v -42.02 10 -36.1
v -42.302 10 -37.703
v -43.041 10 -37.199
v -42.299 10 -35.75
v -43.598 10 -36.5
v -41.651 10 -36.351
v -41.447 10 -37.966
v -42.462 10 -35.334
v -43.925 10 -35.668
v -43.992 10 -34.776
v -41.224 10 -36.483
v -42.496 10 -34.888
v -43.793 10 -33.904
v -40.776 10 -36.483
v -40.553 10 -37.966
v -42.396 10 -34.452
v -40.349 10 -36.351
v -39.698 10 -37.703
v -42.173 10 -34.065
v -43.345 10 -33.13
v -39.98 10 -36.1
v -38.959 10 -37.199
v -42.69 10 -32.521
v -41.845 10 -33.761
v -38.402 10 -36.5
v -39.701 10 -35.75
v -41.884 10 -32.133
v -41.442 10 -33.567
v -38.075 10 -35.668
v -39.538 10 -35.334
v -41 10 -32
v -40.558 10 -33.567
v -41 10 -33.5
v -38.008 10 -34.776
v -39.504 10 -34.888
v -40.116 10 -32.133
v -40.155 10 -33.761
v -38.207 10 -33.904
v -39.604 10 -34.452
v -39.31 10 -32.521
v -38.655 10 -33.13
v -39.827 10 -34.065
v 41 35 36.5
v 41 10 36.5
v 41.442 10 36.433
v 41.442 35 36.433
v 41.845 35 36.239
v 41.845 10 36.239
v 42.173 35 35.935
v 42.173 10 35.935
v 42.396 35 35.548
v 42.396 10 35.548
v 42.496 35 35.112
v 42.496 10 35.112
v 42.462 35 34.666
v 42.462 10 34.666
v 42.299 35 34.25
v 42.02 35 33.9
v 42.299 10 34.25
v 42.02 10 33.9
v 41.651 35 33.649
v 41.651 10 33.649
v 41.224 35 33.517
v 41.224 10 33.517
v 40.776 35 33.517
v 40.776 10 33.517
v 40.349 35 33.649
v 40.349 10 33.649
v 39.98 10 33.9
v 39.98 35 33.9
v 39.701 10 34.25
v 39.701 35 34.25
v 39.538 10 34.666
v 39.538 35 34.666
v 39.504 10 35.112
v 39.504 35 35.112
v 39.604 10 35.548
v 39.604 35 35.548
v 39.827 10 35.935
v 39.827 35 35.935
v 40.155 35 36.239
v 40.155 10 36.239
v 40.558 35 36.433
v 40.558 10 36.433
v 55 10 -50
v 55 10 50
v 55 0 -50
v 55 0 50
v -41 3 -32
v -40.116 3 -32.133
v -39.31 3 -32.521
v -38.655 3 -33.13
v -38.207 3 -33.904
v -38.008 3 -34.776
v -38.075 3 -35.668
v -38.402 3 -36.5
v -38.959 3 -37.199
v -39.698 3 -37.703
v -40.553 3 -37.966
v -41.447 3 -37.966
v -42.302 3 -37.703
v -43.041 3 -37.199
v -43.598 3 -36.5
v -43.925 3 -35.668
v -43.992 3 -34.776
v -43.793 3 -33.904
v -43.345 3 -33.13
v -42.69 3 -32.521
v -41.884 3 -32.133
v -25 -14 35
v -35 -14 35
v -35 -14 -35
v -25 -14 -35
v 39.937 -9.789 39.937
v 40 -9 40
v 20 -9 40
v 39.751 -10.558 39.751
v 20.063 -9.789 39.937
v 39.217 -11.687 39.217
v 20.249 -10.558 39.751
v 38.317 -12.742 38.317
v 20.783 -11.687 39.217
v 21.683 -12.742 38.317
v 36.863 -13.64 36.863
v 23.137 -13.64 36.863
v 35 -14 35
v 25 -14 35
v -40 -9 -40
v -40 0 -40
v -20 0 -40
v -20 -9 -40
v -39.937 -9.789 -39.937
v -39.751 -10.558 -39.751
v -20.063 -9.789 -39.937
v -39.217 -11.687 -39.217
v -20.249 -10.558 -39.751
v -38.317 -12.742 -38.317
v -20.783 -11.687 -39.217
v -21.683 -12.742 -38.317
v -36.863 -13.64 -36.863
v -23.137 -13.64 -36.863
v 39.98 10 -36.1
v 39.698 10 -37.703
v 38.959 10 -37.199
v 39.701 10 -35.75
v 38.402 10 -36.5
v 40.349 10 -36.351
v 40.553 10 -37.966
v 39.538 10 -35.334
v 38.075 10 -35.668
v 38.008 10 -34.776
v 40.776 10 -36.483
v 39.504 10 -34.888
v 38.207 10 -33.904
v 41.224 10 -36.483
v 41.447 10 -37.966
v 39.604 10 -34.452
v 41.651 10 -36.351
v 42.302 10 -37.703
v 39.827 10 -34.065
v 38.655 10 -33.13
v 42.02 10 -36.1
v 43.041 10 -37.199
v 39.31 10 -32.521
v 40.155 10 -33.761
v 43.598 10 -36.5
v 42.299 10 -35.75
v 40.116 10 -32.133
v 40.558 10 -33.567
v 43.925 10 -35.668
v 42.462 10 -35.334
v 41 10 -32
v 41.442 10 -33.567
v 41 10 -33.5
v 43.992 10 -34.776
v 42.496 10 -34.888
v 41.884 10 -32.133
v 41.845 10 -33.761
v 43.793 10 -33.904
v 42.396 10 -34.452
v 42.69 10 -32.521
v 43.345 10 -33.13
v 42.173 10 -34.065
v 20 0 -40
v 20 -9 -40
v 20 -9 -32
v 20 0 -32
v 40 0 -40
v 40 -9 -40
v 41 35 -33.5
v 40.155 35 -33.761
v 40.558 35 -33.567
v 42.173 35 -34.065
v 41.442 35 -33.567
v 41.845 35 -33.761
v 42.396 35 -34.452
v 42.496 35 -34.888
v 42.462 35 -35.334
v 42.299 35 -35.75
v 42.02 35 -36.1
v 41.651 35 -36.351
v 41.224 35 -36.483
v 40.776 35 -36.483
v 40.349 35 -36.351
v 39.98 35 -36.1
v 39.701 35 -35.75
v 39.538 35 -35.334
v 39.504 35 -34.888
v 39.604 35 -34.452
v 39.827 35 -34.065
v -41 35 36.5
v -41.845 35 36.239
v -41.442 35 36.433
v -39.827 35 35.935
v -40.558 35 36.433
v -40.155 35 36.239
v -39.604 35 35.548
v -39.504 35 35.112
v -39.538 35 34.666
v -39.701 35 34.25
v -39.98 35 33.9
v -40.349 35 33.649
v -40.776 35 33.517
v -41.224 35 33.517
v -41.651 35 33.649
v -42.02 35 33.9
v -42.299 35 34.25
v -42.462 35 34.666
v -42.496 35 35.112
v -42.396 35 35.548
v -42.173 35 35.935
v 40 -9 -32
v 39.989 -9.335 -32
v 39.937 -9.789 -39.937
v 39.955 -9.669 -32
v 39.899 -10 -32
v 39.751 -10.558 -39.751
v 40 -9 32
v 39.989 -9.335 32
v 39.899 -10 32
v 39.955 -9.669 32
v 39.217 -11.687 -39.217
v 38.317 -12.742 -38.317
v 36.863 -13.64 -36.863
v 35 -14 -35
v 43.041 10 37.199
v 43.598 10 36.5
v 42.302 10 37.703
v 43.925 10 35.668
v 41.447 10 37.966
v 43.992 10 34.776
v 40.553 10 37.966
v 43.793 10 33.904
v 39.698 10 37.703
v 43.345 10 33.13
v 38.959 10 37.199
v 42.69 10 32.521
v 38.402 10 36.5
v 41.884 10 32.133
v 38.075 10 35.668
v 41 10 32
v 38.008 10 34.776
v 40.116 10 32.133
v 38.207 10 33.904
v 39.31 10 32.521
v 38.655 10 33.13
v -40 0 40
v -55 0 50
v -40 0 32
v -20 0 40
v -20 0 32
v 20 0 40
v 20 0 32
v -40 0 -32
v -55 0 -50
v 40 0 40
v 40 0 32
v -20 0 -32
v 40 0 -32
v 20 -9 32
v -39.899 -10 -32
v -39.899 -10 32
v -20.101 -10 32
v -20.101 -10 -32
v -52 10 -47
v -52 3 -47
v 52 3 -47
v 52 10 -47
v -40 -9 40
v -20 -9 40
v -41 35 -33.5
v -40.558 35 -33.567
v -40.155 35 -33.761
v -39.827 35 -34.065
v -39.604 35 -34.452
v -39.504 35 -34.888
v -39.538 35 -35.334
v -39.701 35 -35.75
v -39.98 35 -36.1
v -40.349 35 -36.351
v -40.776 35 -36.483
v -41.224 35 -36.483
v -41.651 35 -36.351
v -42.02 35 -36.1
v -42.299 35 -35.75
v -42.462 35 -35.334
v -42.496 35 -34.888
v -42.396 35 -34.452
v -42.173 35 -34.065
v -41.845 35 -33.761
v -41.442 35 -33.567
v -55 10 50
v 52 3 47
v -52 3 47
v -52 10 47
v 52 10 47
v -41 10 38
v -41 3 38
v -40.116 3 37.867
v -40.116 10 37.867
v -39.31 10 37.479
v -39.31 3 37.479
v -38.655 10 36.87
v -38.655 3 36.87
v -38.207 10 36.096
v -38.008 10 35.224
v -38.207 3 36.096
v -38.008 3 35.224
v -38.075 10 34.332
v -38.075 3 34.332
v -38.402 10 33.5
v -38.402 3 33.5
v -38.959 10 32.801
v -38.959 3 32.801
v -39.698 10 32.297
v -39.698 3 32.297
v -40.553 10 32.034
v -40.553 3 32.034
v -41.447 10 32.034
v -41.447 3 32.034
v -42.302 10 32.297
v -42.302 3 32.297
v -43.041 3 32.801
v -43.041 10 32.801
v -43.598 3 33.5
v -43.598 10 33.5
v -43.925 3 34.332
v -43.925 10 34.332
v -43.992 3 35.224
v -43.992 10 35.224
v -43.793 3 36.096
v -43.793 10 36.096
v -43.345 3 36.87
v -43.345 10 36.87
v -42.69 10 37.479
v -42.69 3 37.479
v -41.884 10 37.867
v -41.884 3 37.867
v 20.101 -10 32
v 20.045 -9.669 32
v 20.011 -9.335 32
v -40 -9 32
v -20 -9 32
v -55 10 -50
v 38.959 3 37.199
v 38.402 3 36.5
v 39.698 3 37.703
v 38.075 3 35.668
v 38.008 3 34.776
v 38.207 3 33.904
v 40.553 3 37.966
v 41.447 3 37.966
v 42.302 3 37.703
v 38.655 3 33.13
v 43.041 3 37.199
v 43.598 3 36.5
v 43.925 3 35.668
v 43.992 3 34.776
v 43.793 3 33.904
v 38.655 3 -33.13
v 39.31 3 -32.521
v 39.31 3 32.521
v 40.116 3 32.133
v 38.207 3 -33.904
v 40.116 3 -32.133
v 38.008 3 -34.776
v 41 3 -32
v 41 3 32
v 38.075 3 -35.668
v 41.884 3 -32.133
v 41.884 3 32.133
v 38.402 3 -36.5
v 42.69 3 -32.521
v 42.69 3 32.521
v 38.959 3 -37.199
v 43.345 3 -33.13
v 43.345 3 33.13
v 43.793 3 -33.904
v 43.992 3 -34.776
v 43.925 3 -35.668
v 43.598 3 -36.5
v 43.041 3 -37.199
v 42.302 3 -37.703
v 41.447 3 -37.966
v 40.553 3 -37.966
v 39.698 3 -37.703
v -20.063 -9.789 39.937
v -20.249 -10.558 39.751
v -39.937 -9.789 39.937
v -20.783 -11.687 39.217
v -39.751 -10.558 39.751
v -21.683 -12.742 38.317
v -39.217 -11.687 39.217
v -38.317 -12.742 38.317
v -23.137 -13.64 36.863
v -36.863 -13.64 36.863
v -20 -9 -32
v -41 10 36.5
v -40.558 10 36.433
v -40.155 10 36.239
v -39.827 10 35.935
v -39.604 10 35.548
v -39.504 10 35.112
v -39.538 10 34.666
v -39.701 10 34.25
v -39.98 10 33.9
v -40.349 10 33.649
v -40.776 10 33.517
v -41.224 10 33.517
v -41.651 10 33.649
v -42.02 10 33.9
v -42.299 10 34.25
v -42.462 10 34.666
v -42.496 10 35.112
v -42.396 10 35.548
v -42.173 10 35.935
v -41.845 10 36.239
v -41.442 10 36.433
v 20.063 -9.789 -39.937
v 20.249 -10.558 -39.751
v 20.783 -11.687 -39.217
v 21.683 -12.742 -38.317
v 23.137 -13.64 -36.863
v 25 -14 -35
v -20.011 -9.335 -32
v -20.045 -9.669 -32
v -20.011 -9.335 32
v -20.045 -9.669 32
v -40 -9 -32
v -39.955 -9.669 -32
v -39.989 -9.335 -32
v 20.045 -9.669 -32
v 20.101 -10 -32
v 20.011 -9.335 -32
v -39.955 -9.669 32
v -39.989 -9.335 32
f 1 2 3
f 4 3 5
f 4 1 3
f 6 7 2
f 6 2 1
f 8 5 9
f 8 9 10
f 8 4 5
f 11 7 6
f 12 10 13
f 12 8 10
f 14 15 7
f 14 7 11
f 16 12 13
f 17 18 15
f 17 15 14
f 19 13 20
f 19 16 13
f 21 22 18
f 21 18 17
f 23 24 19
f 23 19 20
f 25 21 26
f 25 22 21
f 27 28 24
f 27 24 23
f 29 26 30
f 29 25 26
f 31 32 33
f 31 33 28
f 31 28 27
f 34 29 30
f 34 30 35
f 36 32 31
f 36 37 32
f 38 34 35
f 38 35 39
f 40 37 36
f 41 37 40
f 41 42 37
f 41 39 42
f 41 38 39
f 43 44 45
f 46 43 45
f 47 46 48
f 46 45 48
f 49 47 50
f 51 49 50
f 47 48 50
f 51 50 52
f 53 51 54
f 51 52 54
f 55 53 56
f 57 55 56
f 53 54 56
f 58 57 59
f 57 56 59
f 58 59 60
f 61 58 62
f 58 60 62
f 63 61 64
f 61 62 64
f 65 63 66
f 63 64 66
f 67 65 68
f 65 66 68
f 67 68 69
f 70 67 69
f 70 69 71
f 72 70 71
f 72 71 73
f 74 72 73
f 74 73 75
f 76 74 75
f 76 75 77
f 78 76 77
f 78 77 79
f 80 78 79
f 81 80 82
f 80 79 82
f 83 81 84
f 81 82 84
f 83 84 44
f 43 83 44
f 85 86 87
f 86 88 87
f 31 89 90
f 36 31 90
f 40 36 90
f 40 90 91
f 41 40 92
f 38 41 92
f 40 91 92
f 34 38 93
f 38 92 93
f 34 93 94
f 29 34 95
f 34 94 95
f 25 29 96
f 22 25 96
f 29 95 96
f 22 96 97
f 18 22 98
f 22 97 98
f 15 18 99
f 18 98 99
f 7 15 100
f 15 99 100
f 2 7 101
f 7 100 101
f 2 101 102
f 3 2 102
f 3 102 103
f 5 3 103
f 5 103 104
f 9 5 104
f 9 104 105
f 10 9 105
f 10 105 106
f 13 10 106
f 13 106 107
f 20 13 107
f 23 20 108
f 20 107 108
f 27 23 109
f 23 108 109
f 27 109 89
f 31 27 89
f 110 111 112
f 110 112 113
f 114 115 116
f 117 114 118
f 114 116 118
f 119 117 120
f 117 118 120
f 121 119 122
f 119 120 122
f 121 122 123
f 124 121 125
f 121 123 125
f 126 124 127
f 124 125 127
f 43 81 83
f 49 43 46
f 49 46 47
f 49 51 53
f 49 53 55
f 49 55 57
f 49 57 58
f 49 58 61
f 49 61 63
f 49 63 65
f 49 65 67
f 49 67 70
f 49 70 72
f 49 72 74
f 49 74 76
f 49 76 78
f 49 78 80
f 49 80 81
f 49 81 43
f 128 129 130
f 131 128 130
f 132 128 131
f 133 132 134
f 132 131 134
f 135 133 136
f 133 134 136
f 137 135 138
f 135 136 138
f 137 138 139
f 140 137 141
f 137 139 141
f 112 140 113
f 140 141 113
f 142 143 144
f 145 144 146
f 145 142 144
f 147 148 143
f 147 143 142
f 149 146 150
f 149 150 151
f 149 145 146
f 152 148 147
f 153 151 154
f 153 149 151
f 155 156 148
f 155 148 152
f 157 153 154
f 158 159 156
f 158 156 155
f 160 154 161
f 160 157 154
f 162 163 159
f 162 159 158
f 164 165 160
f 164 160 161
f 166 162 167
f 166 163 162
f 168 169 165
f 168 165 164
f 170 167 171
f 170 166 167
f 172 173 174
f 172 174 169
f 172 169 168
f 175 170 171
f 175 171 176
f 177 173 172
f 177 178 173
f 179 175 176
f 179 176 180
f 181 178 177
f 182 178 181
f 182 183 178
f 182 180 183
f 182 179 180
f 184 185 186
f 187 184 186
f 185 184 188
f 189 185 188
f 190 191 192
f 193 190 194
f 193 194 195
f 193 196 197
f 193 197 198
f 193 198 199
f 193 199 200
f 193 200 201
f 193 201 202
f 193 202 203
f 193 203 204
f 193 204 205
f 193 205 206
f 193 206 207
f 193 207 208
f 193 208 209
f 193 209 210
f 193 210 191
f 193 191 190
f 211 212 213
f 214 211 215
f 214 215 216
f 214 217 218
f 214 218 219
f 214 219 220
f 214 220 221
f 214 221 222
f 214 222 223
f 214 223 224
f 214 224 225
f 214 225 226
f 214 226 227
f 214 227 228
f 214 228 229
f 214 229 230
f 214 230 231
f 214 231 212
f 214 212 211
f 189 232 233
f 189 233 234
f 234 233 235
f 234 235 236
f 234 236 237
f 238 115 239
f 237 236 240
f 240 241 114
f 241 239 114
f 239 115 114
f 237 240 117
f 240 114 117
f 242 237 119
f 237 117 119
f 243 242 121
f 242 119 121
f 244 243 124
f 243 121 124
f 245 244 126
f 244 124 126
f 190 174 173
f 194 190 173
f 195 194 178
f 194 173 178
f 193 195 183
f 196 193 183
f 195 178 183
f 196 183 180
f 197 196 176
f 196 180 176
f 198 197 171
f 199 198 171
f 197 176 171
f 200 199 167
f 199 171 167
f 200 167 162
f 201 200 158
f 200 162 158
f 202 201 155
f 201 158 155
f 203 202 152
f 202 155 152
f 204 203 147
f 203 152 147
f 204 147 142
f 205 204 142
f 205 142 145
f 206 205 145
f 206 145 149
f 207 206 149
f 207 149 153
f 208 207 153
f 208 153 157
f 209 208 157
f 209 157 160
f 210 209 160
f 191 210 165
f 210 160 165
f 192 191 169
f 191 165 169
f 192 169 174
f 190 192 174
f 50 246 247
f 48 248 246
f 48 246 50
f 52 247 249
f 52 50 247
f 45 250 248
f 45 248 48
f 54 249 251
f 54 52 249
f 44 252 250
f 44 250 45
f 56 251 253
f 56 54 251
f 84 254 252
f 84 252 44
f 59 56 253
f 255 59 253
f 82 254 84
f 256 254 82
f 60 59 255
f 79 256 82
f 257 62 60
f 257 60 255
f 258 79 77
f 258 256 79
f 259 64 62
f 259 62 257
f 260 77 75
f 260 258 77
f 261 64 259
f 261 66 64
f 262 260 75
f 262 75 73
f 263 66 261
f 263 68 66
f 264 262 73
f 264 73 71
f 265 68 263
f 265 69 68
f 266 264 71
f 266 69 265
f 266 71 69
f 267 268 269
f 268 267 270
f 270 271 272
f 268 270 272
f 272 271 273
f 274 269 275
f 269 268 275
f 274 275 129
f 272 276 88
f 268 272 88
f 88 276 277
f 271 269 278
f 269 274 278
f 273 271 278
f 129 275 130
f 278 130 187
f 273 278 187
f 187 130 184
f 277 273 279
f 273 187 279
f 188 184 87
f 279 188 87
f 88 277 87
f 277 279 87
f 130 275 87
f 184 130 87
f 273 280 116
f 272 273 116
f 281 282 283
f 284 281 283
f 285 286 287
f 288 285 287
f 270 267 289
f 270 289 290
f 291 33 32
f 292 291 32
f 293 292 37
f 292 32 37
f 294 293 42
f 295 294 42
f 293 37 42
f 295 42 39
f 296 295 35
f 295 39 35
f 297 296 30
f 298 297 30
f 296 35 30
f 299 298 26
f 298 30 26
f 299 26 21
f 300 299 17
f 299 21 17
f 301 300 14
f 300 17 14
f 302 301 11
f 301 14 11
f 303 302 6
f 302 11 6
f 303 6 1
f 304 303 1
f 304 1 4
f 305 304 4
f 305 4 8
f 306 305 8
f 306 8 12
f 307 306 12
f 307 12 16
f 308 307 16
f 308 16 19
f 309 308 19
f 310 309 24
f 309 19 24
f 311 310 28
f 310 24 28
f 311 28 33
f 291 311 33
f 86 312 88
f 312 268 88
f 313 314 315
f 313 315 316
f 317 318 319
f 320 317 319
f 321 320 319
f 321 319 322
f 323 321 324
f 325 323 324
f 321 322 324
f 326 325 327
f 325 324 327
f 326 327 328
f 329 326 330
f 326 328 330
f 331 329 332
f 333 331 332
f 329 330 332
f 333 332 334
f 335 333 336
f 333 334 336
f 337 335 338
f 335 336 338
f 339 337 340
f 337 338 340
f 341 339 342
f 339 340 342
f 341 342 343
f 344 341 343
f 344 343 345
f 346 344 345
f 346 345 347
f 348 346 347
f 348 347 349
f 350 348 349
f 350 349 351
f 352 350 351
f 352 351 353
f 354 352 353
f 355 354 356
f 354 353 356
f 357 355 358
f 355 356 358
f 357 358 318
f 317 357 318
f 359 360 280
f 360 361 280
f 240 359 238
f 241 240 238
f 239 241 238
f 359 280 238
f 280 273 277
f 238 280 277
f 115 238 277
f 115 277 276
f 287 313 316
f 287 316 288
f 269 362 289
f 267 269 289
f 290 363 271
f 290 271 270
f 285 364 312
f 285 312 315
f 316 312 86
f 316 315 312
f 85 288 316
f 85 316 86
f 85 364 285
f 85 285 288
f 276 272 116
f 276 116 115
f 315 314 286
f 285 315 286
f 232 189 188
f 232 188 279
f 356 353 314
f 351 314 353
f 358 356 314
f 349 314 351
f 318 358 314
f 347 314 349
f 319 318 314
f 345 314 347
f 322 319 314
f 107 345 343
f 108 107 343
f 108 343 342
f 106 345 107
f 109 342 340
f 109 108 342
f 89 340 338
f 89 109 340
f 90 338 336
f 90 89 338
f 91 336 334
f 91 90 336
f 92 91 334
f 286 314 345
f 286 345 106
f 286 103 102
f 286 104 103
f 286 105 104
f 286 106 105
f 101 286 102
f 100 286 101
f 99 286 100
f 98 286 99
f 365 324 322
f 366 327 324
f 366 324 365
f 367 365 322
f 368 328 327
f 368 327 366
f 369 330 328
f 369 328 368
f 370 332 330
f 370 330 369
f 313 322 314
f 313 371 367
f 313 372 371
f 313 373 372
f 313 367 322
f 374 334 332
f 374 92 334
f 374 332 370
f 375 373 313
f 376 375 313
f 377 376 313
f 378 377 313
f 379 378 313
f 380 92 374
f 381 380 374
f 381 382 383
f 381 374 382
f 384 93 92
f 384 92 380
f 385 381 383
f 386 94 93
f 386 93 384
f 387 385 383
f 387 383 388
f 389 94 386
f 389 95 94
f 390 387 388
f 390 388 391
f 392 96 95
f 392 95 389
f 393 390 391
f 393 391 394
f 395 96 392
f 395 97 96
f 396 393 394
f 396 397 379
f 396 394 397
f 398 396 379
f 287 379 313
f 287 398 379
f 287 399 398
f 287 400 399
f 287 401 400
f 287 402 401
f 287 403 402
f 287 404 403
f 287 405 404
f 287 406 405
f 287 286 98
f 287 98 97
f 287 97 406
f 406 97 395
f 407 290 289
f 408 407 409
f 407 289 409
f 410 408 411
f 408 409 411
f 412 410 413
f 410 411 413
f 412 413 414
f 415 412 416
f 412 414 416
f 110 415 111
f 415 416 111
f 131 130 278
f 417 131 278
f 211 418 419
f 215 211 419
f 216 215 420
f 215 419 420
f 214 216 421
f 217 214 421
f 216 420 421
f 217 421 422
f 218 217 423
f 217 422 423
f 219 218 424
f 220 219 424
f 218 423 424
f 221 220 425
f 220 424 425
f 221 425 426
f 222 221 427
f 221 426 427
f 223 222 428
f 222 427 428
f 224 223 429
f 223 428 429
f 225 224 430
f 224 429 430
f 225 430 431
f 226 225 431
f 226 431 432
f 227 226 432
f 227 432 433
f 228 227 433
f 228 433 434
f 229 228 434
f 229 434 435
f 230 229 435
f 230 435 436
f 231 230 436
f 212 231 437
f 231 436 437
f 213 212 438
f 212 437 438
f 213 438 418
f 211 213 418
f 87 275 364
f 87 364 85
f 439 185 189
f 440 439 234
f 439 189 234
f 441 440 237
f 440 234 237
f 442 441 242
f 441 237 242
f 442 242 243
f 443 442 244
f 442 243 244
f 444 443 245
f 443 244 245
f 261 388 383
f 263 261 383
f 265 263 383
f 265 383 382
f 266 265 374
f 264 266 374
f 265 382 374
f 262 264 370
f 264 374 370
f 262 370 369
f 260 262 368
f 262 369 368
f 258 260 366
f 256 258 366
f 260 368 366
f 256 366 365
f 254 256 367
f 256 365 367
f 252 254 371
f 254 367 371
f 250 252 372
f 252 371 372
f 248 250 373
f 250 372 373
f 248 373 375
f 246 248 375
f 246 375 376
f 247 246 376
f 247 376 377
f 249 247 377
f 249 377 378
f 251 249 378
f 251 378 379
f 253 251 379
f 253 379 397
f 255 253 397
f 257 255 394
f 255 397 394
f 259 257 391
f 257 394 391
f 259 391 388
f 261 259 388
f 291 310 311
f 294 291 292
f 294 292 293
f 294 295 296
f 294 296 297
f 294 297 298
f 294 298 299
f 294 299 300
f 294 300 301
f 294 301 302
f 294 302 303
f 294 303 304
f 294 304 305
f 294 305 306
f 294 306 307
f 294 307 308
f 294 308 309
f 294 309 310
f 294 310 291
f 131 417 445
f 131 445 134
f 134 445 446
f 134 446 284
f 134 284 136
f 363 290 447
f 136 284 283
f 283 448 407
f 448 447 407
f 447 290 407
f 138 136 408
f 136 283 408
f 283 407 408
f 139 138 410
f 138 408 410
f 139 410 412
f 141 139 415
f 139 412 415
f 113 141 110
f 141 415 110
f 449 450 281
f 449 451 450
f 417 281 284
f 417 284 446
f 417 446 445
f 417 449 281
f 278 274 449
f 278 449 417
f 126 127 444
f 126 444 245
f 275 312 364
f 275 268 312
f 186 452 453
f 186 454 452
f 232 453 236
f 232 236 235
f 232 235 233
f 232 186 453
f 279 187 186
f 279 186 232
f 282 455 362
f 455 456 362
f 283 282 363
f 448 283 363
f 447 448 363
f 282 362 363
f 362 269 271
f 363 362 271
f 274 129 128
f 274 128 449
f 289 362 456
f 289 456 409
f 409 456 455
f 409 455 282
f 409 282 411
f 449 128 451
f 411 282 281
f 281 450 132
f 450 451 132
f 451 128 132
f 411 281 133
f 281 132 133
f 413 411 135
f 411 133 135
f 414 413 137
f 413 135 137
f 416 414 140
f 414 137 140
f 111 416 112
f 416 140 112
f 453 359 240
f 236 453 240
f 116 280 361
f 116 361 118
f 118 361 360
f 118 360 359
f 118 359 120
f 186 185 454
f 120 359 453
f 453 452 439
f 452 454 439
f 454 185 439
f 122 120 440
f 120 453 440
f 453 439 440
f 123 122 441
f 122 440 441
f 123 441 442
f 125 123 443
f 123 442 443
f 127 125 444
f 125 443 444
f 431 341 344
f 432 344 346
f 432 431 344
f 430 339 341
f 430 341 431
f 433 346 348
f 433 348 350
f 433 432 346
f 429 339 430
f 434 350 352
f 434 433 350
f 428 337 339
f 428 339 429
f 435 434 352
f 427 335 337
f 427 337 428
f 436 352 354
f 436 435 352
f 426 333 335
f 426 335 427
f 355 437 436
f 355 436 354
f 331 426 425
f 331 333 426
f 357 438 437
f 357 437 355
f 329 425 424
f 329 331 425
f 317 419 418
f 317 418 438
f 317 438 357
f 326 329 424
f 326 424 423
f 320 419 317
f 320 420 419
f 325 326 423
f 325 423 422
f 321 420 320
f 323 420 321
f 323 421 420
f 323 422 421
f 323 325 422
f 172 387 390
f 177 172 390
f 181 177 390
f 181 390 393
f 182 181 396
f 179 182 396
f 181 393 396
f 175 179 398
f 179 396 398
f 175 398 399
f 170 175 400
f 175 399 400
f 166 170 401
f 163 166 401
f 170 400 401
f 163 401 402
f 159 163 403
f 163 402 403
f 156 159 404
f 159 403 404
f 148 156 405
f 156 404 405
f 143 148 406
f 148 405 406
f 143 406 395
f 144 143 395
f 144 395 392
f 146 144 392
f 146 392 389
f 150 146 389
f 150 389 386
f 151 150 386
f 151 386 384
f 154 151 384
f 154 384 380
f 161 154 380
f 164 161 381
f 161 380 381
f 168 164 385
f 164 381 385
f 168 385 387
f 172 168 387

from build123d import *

# Parameters (mm, degrees)
SKETCH1_W           = 110
SKETCH1_H           = 100
BOSS_EXTRUDE1_DEPTH = 3
SKETCH2_W           = 110
SKETCH2_H           = 100
SKETCH2_W_2         = 104
SKETCH2_H_2         = 94
SKETCH2_R           = 3
BOSS_EXTRUDE2_DEPTH = 7
SKETCH3_R           = 1.5
BOSS_EXTRUDE3_DEPTH = 25
SKETCH5_W           = 20
SKETCH5_H           = 8
BOSS_EXTRUDE4_DEPTH = 10
SKETCH6_W           = 20
SKETCH6_H           = 80
BOSS_EXTRUDE5_DEPTH = 4
FILLET1_R           = 5


with BuildPart() as part:
    # Sketch1 → Boss-Extrude1 (new body)
    with BuildSketch(Plane(origin=(0, 0, 0), x_dir=(1, 0, 0), z_dir=(0, 1, 0))):
        Rectangle(SKETCH1_W, SKETCH1_H)
    extrude(amount=BOSS_EXTRUDE1_DEPTH)

    # Sketch2 → Boss-Extrude2 (add)
    # profile 1 of 5: a face of its own
    with BuildSketch(Plane(origin=(0, 3, 0), x_dir=(1, 0, 0), z_dir=(0, 1, 0))):
        Rectangle(SKETCH2_W, SKETCH2_H)
        Rectangle(SKETCH2_W_2, SKETCH2_H_2, mode=Mode.SUBTRACT)
    # profile 2 of 5: a face of its own
    with BuildSketch(Plane(origin=(0, 3, 0), x_dir=(1, 0, 0), z_dir=(0, 1, 0))):
        with Locations(Location((-41, 35, 0), (0, 0, 270))):
            Circle(SKETCH2_R)
    # profile 3 of 5: a face of its own
    with BuildSketch(Plane(origin=(0, 3, 0), x_dir=(1, 0, 0), z_dir=(0, 1, 0))):
        with Locations(Location((-41, -35, 0), (0, 0, 270))):
            Circle(SKETCH2_R)
    # profile 4 of 5: a face of its own
    with BuildSketch(Plane(origin=(0, 3, 0), x_dir=(1, 0, 0), z_dir=(0, 1, 0))):
        with Locations(Location((41, 35, 0), (0, 0, 270))):
            Circle(SKETCH2_R)
    # profile 5 of 5: a face of its own
    with BuildSketch(Plane(origin=(0, 3, 0), x_dir=(1, 0, 0), z_dir=(0, 1, 0))):
        with Locations(Location((41, -35, 0), (0, 0, 90))):
            Circle(SKETCH2_R)
    extrude(amount=BOSS_EXTRUDE2_DEPTH)

    # Sketch3 → Boss-Extrude3 (add)
    with BuildSketch(Plane(origin=(0, 10, 0), x_dir=(1, 0, 0), z_dir=(0, 1, 0))):
        with Locations(Location((-41, 35, 0), (0, 0, 270))):
            Circle(SKETCH3_R)
        with Locations(Location((41, 35, 0), (0, 0, 270))):
            Circle(SKETCH3_R)
        with Locations(Location((41, -35, 0), (0, 0, 270))):
            Circle(SKETCH3_R)
        with Locations(Location((-41, -35, 0), (0, 0, 270))):
            Circle(SKETCH3_R)
    extrude(amount=BOSS_EXTRUDE3_DEPTH)

    # Sketch5 → Boss-Extrude4 (add)
    with BuildSketch(Plane.XZ):
        with Locations((-30, -36)):
            Rectangle(SKETCH5_W, SKETCH5_H)
        with Locations((-30, 36)):
            Rectangle(SKETCH5_W, SKETCH5_H)
        with Locations((30, 36)):
            Rectangle(SKETCH5_W, SKETCH5_H)
        with Locations((30, -36)):
            Rectangle(SKETCH5_W, SKETCH5_H)
    extrude(amount=BOSS_EXTRUDE4_DEPTH)

    # Sketch6 → Boss-Extrude5 (add)
    with BuildSketch(Plane.XZ.offset(10)):
        with Locations((-30, 0)):
            Rectangle(SKETCH6_W, SKETCH6_H)
        with Locations((30, 0)):
            Rectangle(SKETCH6_W, SKETCH6_H)
    extrude(amount=BOSS_EXTRUDE5_DEPTH)

    # Fillet1
    # the kernel refuses this fillet: 5 mm, written as the material it takes off along each edge
    with BuildSketch(Plane(origin=(-40, -14, -52.5), x_dir=(1, 0, 0), z_dir=(0, 0, 1)), Plane(origin=(-20, -14, 52.5), x_dir=(-1, 0, 0), z_dir=(0, 0, -1)), Plane(origin=(20, -14, -52.5), x_dir=(1, 0, 0), z_dir=(0, 0, 1)), Plane(origin=(40, -14, 52.5), x_dir=(-1, 0, 0), z_dir=(0, 0, -1))) as fillet1_piece_1:
        with BuildLine():
            CenterArc((FILLET1_R, FILLET1_R), FILLET1_R, 180, 90)
            Line((0, FILLET1_R), (0, 0))
            Line((0, 0), (FILLET1_R, 0))
        make_face()
    extrude(amount=105, mode=Mode.SUBTRACT)
    with BuildSketch(Plane(origin=(7.5, -14, 40), x_dir=(0, 0, -1), z_dir=(1, 0, 0)), Plane(origin=(-52.5, -14, 40), x_dir=(0, 0, -1), z_dir=(1, 0, 0))) as fillet1_piece_2:
        with BuildLine():
            CenterArc((FILLET1_R, FILLET1_R), FILLET1_R, 180, 90)
            Line((0, FILLET1_R), (0, 0))
            Line((0, 0), (FILLET1_R, 0))
        make_face()
    extrude(amount=45, mode=Mode.SUBTRACT)
    with BuildSketch(Plane(origin=(52.5, -14, -40), x_dir=(0, 1, 0), z_dir=(-1, 0, 0)), Plane(origin=(-7.5, -14, -40), x_dir=(0, 1, 0), z_dir=(-1, 0, 0))) as fillet1_piece_3:
        with BuildLine():
            CenterArc((FILLET1_R, -FILLET1_R), FILLET1_R, 90, 90)
            Line((0, -FILLET1_R), (0, 0))
            Line((0, 0), (FILLET1_R, 0))
        make_face()
    extrude(amount=45, mode=Mode.SUBTRACT)


solid = part.part
